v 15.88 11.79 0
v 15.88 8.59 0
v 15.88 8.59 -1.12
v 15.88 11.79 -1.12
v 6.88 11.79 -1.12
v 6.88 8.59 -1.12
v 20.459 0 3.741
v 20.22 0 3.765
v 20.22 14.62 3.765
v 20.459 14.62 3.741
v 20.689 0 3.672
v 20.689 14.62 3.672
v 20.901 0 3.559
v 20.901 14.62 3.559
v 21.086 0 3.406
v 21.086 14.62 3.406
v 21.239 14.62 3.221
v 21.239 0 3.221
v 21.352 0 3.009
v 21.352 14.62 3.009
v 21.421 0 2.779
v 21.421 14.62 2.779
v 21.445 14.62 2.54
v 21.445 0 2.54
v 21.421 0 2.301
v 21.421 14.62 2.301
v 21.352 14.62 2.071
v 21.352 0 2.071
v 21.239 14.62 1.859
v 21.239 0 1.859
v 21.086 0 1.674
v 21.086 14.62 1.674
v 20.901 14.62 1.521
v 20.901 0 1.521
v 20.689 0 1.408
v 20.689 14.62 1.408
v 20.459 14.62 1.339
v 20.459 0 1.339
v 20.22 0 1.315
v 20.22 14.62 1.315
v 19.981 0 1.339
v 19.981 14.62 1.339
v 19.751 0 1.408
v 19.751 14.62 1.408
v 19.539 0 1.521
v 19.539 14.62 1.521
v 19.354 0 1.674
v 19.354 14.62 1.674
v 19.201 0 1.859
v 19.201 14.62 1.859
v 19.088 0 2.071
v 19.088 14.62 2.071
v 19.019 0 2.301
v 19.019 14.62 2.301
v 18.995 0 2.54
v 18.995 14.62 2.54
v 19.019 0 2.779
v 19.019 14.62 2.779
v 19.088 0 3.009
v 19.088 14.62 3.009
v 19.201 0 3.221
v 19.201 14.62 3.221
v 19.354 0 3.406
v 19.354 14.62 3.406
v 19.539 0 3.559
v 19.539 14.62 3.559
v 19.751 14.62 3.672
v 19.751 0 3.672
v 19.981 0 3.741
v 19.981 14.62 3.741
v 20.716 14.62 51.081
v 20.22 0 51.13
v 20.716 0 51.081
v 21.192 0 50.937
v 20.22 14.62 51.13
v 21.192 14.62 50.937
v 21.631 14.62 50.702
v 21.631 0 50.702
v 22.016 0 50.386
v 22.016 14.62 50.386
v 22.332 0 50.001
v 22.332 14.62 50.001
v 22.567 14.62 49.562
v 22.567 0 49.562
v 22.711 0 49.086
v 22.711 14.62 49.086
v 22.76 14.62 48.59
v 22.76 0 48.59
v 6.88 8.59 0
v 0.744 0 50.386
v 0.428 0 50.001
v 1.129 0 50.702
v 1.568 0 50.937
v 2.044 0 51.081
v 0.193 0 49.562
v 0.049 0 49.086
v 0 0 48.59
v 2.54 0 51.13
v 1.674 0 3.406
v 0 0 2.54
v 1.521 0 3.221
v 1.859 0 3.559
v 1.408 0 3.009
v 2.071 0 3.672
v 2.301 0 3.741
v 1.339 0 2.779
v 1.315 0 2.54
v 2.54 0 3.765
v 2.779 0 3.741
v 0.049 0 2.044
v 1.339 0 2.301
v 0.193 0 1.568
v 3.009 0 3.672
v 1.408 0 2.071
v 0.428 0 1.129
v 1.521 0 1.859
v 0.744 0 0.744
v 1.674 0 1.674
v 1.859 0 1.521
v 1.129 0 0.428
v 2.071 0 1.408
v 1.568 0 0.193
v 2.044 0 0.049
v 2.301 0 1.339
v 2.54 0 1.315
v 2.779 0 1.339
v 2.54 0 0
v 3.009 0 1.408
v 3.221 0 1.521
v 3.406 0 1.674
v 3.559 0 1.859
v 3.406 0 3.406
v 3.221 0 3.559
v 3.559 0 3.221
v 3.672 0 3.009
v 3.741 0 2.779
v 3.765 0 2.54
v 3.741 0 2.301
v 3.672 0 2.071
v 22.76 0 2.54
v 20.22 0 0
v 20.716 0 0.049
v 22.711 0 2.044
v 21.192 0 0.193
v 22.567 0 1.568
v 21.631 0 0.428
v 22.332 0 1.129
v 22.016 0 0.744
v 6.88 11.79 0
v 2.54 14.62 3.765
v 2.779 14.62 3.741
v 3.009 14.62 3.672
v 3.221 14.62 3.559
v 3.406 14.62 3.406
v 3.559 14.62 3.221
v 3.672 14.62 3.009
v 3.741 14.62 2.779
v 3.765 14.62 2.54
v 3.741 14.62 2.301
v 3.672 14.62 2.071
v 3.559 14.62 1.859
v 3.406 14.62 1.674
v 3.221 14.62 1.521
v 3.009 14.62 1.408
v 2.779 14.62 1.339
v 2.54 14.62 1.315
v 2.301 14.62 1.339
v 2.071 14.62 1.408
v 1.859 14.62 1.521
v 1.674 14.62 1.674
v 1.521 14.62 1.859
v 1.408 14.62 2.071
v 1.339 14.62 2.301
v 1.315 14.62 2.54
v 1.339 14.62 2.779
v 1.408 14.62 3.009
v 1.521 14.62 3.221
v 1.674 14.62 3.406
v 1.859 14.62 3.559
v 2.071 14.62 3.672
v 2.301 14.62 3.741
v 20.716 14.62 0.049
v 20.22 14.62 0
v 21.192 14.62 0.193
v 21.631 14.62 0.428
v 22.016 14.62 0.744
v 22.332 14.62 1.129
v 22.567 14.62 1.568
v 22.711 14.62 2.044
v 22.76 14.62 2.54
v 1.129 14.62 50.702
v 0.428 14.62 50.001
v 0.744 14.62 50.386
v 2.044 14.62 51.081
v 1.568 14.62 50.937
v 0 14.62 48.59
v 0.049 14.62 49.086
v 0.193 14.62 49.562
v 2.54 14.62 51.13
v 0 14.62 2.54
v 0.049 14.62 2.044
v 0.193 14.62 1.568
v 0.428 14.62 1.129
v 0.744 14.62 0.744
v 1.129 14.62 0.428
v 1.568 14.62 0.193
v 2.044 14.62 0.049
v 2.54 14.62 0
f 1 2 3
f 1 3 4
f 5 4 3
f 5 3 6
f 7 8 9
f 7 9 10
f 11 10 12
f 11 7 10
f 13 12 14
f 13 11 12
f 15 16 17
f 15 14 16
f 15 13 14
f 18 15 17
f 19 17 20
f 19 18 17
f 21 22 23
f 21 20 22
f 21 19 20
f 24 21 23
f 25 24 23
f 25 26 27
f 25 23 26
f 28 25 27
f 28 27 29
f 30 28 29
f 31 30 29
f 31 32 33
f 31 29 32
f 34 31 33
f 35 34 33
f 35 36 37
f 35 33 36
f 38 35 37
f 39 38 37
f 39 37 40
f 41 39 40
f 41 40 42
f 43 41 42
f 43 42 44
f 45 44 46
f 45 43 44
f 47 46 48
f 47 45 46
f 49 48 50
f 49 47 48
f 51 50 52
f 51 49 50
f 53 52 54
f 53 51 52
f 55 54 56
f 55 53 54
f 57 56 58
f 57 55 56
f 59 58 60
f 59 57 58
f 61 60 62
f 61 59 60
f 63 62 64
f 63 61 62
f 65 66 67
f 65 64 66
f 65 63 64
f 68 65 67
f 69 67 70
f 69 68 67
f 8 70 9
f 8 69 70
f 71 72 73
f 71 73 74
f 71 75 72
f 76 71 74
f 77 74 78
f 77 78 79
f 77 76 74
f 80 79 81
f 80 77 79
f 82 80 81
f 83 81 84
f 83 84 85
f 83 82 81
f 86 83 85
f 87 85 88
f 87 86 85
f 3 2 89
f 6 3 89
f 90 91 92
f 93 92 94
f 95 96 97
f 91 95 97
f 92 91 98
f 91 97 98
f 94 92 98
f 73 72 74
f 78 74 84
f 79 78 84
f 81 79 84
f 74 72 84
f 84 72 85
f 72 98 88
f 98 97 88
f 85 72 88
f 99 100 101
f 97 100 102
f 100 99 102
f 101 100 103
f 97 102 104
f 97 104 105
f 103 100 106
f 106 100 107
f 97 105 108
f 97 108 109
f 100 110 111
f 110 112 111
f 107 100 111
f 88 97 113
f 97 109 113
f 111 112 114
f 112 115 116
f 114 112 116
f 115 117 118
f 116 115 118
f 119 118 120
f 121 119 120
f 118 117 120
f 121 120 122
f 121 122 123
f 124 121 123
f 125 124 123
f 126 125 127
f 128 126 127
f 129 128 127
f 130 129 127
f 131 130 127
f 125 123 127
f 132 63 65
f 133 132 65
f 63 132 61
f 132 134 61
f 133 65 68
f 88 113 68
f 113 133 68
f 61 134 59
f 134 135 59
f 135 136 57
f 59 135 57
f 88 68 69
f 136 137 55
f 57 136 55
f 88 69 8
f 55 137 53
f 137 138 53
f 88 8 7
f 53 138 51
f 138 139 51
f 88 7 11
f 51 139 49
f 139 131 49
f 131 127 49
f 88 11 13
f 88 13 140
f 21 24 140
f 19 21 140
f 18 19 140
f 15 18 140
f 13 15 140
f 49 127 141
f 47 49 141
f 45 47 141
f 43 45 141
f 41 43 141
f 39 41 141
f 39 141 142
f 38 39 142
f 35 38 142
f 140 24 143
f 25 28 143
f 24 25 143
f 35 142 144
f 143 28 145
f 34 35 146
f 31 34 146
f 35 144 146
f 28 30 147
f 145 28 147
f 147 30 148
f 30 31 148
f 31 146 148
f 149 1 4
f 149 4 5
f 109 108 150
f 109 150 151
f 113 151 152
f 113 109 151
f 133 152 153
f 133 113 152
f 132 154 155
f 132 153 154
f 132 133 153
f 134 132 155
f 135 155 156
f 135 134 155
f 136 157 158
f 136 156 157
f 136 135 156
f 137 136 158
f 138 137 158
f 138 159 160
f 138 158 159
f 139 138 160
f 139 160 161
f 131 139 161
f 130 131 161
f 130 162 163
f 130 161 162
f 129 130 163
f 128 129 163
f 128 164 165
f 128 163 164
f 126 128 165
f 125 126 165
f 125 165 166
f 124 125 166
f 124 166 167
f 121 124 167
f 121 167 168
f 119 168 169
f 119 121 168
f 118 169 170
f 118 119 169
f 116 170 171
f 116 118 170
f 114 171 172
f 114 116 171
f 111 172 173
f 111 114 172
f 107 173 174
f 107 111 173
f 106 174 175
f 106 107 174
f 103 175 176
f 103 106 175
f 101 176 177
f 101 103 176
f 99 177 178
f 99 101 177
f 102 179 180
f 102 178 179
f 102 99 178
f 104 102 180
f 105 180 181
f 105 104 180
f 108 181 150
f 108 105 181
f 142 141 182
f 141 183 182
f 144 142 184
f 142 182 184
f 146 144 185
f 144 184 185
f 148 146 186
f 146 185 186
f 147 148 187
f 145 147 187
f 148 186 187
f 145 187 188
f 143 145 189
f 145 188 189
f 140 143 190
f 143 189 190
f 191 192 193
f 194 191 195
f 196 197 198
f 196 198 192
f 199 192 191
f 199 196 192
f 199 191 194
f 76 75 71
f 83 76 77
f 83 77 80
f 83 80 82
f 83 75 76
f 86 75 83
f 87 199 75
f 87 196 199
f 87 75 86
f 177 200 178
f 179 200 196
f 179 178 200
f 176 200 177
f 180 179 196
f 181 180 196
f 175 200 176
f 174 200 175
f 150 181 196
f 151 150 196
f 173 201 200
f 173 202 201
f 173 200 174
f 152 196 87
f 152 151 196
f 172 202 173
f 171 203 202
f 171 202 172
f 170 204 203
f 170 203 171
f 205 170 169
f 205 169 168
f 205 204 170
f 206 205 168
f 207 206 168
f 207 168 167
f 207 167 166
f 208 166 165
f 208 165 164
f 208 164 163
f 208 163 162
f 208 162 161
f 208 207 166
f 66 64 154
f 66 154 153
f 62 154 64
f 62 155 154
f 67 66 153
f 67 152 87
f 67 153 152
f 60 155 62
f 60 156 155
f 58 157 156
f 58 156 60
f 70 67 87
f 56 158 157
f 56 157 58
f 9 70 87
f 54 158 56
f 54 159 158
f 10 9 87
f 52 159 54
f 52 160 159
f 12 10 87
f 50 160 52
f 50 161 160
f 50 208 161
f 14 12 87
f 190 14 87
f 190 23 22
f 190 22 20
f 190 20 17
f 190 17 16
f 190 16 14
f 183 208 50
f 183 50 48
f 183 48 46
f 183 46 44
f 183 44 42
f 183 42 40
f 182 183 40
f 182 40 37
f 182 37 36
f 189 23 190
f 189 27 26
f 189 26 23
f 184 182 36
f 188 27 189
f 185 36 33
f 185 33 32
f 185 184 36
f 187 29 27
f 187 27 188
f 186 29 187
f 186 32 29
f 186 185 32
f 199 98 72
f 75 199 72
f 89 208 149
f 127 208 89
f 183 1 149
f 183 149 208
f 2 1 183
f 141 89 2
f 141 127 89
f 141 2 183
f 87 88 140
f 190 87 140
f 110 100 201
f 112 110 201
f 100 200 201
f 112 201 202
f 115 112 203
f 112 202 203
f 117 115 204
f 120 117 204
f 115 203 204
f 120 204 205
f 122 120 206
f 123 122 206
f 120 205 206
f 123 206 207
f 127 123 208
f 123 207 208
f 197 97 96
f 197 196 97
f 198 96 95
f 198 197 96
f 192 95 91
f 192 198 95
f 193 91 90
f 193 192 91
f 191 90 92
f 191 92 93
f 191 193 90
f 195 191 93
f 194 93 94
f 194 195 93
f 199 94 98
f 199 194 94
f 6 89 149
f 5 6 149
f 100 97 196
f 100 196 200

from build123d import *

# Parameters (mm, degrees)
SKETCH1_W               = 22.76
SKETCH1_H               = 51.13
BOSS_EXTRUDE1_DEPTH     = 14.62
CUT_EXTRUDE1_DEPTH      = 58.844955701
CUT_EXTRUDE1_DEPTH_BACK = 58.844955701
SKETCH2_R               = 1.225
FILLET1_R               = 2.54
SKETCH4_W               = 9
SKETCH4_H               = 3.2
BOSS_EXTRUDE3_DEPTH     = 1.12


with BuildPart() as part:
    # Sketch1 → Boss-Extrude1 (new body)
    with BuildSketch(Plane(origin=(0, 0, 0), x_dir=(1, 0, 0), z_dir=(0, 1, 0))):
        with Locations((11.38, -25.565)):
            Rectangle(SKETCH1_W, SKETCH1_H)
    extrude(amount=BOSS_EXTRUDE1_DEPTH)

    # Sketch2 → Cut-Extrude1 (cut, two sides: drawn at the far end of the back side and taken through both)
    with BuildSketch(Plane(origin=(0, 14.62, 0), x_dir=(1, 0, 0), z_dir=(0, 1, 0)).offset(-CUT_EXTRUDE1_DEPTH_BACK)):
        with Locations(Location((2.54, -2.54, 0), (0, 0, 270))):
            Circle(SKETCH2_R)
        with Locations(Location((20.22, -2.54, 0), (0, 0, 270))):
            Circle(SKETCH2_R)
    extrude(amount=CUT_EXTRUDE1_DEPTH + CUT_EXTRUDE1_DEPTH_BACK, mode=Mode.SUBTRACT)

    # Fillet1
    fillet1_edges = [part.edges().sort_by_distance(p)[0] for p in [
        (0, 7.31, 0),
        (22.76, 7.31, 0),
        (22.76, 7.31, 51.13),
        (0, 7.31, 51.13),
    ]]
    fillet(fillet1_edges, radius=FILLET1_R)

    # Sketch4 → Boss-Extrude3 (add)
    with BuildSketch(Plane(origin=(0, 0, 0), x_dir=(-1, 0, 0), z_dir=(0, 0, -1))):
        with Locations((-11.38, 10.19)):
            Rectangle(SKETCH4_W, SKETCH4_H)
    extrude(amount=BOSS_EXTRUDE3_DEPTH)


solid = part.part
